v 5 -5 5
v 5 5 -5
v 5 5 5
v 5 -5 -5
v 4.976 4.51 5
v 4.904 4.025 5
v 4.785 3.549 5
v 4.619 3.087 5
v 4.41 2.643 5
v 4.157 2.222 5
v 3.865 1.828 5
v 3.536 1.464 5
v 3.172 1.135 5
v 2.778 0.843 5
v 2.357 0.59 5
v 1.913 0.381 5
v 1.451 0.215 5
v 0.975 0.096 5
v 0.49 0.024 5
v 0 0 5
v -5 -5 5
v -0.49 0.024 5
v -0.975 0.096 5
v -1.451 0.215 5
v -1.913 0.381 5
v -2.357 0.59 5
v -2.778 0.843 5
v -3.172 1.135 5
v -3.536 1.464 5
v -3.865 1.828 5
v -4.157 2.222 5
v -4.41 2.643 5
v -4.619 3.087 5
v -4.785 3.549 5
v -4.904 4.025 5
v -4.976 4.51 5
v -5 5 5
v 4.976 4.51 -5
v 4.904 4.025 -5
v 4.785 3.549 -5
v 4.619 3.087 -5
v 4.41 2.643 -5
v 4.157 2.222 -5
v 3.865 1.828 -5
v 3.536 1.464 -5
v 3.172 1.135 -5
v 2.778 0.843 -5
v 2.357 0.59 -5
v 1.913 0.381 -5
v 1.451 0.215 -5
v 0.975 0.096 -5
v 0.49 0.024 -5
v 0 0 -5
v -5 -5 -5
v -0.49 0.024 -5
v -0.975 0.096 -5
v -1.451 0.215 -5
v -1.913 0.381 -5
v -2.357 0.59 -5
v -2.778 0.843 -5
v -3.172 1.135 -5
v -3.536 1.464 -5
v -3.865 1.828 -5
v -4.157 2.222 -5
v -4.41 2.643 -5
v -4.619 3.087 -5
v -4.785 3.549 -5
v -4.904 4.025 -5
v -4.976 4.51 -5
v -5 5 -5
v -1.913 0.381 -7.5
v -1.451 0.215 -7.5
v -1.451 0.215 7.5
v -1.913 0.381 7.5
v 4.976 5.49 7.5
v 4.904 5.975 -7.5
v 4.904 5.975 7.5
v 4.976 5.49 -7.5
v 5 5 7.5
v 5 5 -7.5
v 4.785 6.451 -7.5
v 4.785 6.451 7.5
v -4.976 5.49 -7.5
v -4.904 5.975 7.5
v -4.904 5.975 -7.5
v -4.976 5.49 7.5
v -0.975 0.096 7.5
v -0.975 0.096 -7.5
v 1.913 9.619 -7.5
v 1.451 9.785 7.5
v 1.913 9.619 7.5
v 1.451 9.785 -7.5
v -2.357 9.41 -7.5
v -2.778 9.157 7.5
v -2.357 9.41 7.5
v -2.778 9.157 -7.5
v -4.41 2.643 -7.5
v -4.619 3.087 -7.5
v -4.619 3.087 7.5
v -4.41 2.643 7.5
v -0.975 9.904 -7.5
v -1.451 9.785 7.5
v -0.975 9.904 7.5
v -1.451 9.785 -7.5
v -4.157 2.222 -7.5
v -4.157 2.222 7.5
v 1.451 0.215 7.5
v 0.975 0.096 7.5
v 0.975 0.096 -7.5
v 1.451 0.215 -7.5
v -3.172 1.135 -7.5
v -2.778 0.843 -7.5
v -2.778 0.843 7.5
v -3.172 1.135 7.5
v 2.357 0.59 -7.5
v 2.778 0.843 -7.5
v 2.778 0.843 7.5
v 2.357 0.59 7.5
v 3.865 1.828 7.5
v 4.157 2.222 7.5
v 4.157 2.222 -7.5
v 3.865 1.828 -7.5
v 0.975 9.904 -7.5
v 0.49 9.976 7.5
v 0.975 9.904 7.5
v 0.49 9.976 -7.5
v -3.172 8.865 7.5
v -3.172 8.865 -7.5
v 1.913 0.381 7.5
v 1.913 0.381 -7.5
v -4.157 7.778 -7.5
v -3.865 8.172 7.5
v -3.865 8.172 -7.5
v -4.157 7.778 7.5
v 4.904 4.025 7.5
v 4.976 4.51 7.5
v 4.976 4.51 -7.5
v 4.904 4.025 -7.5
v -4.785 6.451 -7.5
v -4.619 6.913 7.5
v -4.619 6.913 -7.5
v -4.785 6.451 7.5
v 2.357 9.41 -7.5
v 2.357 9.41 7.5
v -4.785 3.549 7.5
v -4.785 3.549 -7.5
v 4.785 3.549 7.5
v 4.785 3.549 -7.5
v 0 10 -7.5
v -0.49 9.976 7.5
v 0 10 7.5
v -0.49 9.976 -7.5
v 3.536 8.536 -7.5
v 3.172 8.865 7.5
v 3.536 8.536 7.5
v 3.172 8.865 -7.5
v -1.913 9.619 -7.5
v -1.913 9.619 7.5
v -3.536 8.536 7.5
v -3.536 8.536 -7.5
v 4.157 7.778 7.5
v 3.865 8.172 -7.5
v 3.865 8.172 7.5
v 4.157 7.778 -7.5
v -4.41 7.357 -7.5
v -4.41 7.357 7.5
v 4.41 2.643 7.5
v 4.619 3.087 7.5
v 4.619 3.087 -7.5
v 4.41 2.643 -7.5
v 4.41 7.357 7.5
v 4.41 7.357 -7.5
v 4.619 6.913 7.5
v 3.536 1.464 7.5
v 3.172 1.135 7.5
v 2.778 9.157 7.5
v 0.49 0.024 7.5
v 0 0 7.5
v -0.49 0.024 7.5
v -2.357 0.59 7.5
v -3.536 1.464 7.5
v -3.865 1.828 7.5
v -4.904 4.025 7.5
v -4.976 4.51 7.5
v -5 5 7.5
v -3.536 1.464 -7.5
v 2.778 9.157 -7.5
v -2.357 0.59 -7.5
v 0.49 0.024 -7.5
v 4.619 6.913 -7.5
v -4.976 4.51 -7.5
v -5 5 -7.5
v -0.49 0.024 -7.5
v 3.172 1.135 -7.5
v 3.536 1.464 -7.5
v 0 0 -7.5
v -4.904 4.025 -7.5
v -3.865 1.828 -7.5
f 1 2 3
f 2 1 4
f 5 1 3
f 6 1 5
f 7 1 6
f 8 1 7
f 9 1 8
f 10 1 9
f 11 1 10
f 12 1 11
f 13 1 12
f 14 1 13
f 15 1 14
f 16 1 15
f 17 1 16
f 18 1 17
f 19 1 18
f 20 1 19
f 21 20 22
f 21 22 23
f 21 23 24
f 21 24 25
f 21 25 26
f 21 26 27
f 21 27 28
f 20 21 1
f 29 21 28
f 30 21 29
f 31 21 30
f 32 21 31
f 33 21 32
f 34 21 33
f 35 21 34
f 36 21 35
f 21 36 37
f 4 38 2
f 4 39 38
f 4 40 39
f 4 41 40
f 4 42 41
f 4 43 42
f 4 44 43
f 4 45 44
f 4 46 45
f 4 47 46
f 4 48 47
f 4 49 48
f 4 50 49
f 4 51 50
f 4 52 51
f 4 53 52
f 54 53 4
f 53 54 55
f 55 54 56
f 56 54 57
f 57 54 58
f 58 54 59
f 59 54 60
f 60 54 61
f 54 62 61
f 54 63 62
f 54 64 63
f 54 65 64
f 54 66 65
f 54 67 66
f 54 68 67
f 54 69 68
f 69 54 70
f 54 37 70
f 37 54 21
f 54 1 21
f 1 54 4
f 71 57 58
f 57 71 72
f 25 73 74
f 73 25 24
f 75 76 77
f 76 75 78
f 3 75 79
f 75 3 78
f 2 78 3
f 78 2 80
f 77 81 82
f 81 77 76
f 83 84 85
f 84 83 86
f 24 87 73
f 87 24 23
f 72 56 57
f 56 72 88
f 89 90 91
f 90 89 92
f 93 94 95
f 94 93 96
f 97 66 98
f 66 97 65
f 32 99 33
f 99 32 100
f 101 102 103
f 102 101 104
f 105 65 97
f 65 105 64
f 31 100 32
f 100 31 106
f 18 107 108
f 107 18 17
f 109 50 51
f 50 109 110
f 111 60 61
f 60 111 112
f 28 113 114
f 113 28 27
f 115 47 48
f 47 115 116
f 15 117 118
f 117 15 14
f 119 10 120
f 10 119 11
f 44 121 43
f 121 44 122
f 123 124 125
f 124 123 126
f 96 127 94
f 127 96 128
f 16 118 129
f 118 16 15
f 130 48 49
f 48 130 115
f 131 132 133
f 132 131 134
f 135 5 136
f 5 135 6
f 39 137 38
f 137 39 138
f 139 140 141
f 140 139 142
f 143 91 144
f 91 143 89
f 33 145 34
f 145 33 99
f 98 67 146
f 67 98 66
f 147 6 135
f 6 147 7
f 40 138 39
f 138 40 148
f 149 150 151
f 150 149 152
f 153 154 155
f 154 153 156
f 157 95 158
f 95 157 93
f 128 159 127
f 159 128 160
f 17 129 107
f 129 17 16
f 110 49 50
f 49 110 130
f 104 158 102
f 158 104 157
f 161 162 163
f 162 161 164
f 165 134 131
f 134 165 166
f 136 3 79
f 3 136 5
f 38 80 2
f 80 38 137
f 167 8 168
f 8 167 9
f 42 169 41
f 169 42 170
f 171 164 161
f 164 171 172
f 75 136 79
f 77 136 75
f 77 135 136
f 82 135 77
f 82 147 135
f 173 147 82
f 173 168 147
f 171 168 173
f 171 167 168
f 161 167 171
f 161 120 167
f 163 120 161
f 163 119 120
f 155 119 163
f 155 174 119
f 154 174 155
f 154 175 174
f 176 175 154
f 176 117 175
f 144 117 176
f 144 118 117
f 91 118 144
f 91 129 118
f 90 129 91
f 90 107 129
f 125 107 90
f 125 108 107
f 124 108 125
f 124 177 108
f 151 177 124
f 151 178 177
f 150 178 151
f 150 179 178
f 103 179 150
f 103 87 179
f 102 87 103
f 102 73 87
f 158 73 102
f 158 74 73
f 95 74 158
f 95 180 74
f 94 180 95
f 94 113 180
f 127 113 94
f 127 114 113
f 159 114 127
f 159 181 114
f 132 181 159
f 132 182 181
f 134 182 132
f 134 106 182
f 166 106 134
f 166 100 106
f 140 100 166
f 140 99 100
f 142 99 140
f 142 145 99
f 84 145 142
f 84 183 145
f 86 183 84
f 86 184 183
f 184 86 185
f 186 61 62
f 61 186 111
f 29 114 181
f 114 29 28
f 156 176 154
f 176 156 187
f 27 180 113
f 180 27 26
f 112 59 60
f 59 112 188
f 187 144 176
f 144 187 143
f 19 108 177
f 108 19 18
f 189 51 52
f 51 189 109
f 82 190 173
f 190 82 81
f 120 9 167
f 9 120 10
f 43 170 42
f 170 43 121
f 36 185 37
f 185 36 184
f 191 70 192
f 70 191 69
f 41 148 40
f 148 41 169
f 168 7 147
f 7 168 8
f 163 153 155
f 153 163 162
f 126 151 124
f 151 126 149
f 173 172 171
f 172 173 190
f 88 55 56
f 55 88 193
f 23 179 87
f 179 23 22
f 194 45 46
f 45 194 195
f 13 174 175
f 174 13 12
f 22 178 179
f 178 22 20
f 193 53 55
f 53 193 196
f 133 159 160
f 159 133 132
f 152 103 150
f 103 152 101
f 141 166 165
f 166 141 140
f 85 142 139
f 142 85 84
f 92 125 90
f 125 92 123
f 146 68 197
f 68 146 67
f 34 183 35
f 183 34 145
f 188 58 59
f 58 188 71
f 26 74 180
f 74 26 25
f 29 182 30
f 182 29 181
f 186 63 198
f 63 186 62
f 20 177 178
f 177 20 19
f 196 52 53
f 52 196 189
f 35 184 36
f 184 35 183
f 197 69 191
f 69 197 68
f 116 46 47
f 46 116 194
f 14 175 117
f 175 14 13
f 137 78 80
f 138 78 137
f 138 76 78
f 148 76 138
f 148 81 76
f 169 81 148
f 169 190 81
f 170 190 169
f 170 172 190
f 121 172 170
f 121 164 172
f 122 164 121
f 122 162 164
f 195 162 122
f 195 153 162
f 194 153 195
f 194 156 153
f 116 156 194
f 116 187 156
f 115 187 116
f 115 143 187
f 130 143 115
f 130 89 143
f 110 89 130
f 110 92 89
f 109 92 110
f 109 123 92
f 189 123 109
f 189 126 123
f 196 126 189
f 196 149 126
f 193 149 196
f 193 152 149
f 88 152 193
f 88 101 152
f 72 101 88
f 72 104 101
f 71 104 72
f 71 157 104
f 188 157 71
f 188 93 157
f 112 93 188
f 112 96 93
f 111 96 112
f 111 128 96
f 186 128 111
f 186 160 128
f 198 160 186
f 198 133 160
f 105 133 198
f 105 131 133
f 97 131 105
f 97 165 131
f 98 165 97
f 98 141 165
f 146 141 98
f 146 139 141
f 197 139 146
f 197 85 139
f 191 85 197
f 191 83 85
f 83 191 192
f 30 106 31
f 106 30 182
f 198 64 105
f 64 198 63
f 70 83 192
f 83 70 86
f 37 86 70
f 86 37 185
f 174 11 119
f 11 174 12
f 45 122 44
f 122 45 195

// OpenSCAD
// Set fragment number for roundings
$fn = $preview ? 32 : 64;

// Size of the Cube (all directions)
cuSize = 10;

// The diameter of the Cylinder
cyDia = 10;

// The height of the Cylinder
cyHei = 15;

// Y-Translation of the Cylinder
tY = 5;

// Create Cube and move Cylinder by 'tY'
// You can put {} around the shape to translate
// It's optional if you translate only one shape
cube(size = [cuSize, cuSize, cuSize], center = true);
translate([0, tY, 0]){
    cylinder(d = cyDia, h = cyHei, center = true);
}
